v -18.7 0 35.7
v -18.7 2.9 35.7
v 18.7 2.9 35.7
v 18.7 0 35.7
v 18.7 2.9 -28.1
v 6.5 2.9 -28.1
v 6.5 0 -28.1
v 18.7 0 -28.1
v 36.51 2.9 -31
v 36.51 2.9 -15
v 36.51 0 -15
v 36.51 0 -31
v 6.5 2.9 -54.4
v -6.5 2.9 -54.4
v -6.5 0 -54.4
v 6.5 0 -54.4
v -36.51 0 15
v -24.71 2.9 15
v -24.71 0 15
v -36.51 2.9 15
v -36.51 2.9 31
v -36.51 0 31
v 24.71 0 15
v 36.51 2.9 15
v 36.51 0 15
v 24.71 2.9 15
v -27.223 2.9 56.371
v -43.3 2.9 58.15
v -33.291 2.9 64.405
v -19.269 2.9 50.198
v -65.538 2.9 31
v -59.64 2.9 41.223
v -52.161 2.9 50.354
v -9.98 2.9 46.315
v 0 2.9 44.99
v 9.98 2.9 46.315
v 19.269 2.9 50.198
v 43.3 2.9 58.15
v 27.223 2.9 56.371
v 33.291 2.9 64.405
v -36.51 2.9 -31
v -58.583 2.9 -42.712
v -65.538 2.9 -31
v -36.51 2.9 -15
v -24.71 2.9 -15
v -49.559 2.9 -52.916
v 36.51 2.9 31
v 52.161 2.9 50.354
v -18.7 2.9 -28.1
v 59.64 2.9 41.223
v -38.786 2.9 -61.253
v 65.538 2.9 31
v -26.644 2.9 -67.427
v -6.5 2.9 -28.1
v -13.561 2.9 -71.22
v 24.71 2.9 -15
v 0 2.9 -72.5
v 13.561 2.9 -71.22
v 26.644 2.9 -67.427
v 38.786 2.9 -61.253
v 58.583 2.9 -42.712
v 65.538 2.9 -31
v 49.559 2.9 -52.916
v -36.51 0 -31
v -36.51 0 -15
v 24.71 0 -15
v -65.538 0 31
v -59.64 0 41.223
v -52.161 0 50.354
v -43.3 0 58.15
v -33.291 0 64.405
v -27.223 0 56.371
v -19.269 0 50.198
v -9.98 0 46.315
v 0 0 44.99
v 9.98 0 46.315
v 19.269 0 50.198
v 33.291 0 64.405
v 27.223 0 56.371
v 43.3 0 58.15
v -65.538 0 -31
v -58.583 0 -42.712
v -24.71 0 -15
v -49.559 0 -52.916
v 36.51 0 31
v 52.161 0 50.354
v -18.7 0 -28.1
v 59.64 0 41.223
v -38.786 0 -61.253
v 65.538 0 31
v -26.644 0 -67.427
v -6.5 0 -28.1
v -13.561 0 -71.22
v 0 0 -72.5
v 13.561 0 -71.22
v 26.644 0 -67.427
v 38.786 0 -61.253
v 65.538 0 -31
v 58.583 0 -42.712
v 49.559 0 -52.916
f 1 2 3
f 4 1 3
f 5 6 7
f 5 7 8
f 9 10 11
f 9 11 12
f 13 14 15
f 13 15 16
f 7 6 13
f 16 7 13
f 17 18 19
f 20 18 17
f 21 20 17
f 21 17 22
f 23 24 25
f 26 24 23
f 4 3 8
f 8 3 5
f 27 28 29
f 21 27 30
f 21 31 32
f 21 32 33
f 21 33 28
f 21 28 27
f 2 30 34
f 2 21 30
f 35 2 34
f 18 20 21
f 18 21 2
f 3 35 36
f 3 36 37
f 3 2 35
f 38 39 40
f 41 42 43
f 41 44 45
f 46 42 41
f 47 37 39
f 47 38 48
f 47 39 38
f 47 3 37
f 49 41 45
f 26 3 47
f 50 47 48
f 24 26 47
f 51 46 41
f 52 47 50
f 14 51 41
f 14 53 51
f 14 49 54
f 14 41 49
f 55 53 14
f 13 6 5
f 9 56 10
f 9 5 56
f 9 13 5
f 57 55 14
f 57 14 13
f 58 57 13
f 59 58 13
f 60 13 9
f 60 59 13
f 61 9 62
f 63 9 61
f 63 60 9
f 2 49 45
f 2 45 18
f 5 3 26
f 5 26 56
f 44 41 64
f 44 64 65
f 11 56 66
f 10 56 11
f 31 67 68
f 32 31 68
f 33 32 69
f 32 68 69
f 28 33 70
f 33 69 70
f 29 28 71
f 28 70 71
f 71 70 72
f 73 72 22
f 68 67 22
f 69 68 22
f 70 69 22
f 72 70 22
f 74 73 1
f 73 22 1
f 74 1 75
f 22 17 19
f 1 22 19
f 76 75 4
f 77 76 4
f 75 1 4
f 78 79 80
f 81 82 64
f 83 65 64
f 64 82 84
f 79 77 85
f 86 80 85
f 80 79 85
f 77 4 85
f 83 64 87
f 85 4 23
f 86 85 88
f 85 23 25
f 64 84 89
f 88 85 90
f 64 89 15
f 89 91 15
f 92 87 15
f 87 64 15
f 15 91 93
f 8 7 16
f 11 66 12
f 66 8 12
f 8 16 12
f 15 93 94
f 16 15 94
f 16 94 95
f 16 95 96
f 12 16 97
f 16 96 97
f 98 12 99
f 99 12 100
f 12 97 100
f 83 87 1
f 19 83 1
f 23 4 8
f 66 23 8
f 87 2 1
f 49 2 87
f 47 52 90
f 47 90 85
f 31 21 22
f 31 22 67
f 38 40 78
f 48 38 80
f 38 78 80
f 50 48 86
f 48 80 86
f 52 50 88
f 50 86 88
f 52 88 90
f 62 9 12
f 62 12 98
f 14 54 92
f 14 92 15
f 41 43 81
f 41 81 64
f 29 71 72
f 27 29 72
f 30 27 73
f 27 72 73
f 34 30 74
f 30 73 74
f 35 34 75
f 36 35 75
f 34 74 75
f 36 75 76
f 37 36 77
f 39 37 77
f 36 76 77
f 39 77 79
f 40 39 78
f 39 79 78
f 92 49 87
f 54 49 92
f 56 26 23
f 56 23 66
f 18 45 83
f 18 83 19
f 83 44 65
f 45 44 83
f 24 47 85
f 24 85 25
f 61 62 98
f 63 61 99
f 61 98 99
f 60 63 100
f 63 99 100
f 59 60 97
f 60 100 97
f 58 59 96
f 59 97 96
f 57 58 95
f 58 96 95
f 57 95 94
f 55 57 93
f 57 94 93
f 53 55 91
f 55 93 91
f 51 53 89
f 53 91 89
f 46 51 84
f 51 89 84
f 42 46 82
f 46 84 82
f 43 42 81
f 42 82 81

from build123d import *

# Parameters (mm, degrees)
BOSS_EXTRUDE1_DEPTH  = 2.9
SOLENOID_PLACEMENT_W = 37.4
SOLENOID_PLACEMENT_H = 63.8
CUT_EXTRUDE1_DEPTH   = 103.571487266
CUT_EXTRUDE3_DEPTH   = 103.571487266
SKETCH4_W            = 13
SKETCH4_H            = 26.3
CUT_EXTRUDE4_DEPTH   = 98.774792252


with BuildPart() as part:
    # Sketch1 → Boss-Extrude1 (new body)
    with BuildSketch(Plane(origin=(0, 0, 0), x_dir=(1, 0, 0), z_dir=(0, 1, 0))):
        with BuildLine():
            ThreePointArc((33.29110537, -64.404598464), (0, 72.5), (-33.29110537, -64.404598464))
            ThreePointArc((-33.29110537, -64.404598464), (0, -44.989799638), (33.29110537, -64.404598464))
        make_face()
    extrude(amount=BOSS_EXTRUDE1_DEPTH)

    # solenoid placement → Cut-Extrude1 (cut, through all)
    with BuildSketch(Plane(origin=(0, 2.9, 0), x_dir=(1, 0, 0), z_dir=(0, 1, 0))):
        with Locations((0, -3.8)):
            Rectangle(SOLENOID_PLACEMENT_W, SOLENOID_PLACEMENT_H)
    extrude(amount=-CUT_EXTRUDE1_DEPTH, mode=Mode.SUBTRACT)

    # Sketch3 → Cut-Extrude3 (cut, through all)
    with BuildSketch(Plane(origin=(0, 2.9, 0), x_dir=(1, 0, 0), z_dir=(0, 1, 0))):
        with BuildLine():
            Line((-36.51, -15), (-36.51, -31))
            Line((-36.51, -31), (-65.538156825, -31))
            ThreePointArc((-65.538156825, -31), (-72.5, 0), (-65.538156825, 31))
            Line((-65.538156825, 31), (-36.51, 31))
            Line((-36.51, 31), (-36.51, 15))
            Line((-36.51, 15), (-24.71, 15))
            Line((-24.71, 15), (-24.71, -15))
            Line((-24.71, -15), (-36.51, -15))
        make_face()
        with BuildLine():
            Line((36.51, 31), (65.538156825, 31))
            ThreePointArc((65.538156825, 31), (72.5, 0), (65.538156825, -31))
            Line((65.538156825, -31), (36.51, -31))
            Line((36.51, -31), (36.51, -15))
            Line((36.51, -15), (24.71, -15))
            Line((24.71, -15), (24.71, 15))
            Line((24.71, 15), (36.51, 15))
            Line((36.51, 15), (36.51, 31))
        make_face()
    extrude(amount=-CUT_EXTRUDE3_DEPTH, mode=Mode.SUBTRACT)

    # Sketch4 → Cut-Extrude4 (cut, through all)
    with BuildSketch(Plane(origin=(0, 2.9, 0), x_dir=(1, 0, 0), z_dir=(0, 1, 0))):
        with Locations((0, 41.25)):
            Rectangle(SKETCH4_W, SKETCH4_H)
    extrude(amount=-CUT_EXTRUDE4_DEPTH, mode=Mode.SUBTRACT)


solid = part.part
